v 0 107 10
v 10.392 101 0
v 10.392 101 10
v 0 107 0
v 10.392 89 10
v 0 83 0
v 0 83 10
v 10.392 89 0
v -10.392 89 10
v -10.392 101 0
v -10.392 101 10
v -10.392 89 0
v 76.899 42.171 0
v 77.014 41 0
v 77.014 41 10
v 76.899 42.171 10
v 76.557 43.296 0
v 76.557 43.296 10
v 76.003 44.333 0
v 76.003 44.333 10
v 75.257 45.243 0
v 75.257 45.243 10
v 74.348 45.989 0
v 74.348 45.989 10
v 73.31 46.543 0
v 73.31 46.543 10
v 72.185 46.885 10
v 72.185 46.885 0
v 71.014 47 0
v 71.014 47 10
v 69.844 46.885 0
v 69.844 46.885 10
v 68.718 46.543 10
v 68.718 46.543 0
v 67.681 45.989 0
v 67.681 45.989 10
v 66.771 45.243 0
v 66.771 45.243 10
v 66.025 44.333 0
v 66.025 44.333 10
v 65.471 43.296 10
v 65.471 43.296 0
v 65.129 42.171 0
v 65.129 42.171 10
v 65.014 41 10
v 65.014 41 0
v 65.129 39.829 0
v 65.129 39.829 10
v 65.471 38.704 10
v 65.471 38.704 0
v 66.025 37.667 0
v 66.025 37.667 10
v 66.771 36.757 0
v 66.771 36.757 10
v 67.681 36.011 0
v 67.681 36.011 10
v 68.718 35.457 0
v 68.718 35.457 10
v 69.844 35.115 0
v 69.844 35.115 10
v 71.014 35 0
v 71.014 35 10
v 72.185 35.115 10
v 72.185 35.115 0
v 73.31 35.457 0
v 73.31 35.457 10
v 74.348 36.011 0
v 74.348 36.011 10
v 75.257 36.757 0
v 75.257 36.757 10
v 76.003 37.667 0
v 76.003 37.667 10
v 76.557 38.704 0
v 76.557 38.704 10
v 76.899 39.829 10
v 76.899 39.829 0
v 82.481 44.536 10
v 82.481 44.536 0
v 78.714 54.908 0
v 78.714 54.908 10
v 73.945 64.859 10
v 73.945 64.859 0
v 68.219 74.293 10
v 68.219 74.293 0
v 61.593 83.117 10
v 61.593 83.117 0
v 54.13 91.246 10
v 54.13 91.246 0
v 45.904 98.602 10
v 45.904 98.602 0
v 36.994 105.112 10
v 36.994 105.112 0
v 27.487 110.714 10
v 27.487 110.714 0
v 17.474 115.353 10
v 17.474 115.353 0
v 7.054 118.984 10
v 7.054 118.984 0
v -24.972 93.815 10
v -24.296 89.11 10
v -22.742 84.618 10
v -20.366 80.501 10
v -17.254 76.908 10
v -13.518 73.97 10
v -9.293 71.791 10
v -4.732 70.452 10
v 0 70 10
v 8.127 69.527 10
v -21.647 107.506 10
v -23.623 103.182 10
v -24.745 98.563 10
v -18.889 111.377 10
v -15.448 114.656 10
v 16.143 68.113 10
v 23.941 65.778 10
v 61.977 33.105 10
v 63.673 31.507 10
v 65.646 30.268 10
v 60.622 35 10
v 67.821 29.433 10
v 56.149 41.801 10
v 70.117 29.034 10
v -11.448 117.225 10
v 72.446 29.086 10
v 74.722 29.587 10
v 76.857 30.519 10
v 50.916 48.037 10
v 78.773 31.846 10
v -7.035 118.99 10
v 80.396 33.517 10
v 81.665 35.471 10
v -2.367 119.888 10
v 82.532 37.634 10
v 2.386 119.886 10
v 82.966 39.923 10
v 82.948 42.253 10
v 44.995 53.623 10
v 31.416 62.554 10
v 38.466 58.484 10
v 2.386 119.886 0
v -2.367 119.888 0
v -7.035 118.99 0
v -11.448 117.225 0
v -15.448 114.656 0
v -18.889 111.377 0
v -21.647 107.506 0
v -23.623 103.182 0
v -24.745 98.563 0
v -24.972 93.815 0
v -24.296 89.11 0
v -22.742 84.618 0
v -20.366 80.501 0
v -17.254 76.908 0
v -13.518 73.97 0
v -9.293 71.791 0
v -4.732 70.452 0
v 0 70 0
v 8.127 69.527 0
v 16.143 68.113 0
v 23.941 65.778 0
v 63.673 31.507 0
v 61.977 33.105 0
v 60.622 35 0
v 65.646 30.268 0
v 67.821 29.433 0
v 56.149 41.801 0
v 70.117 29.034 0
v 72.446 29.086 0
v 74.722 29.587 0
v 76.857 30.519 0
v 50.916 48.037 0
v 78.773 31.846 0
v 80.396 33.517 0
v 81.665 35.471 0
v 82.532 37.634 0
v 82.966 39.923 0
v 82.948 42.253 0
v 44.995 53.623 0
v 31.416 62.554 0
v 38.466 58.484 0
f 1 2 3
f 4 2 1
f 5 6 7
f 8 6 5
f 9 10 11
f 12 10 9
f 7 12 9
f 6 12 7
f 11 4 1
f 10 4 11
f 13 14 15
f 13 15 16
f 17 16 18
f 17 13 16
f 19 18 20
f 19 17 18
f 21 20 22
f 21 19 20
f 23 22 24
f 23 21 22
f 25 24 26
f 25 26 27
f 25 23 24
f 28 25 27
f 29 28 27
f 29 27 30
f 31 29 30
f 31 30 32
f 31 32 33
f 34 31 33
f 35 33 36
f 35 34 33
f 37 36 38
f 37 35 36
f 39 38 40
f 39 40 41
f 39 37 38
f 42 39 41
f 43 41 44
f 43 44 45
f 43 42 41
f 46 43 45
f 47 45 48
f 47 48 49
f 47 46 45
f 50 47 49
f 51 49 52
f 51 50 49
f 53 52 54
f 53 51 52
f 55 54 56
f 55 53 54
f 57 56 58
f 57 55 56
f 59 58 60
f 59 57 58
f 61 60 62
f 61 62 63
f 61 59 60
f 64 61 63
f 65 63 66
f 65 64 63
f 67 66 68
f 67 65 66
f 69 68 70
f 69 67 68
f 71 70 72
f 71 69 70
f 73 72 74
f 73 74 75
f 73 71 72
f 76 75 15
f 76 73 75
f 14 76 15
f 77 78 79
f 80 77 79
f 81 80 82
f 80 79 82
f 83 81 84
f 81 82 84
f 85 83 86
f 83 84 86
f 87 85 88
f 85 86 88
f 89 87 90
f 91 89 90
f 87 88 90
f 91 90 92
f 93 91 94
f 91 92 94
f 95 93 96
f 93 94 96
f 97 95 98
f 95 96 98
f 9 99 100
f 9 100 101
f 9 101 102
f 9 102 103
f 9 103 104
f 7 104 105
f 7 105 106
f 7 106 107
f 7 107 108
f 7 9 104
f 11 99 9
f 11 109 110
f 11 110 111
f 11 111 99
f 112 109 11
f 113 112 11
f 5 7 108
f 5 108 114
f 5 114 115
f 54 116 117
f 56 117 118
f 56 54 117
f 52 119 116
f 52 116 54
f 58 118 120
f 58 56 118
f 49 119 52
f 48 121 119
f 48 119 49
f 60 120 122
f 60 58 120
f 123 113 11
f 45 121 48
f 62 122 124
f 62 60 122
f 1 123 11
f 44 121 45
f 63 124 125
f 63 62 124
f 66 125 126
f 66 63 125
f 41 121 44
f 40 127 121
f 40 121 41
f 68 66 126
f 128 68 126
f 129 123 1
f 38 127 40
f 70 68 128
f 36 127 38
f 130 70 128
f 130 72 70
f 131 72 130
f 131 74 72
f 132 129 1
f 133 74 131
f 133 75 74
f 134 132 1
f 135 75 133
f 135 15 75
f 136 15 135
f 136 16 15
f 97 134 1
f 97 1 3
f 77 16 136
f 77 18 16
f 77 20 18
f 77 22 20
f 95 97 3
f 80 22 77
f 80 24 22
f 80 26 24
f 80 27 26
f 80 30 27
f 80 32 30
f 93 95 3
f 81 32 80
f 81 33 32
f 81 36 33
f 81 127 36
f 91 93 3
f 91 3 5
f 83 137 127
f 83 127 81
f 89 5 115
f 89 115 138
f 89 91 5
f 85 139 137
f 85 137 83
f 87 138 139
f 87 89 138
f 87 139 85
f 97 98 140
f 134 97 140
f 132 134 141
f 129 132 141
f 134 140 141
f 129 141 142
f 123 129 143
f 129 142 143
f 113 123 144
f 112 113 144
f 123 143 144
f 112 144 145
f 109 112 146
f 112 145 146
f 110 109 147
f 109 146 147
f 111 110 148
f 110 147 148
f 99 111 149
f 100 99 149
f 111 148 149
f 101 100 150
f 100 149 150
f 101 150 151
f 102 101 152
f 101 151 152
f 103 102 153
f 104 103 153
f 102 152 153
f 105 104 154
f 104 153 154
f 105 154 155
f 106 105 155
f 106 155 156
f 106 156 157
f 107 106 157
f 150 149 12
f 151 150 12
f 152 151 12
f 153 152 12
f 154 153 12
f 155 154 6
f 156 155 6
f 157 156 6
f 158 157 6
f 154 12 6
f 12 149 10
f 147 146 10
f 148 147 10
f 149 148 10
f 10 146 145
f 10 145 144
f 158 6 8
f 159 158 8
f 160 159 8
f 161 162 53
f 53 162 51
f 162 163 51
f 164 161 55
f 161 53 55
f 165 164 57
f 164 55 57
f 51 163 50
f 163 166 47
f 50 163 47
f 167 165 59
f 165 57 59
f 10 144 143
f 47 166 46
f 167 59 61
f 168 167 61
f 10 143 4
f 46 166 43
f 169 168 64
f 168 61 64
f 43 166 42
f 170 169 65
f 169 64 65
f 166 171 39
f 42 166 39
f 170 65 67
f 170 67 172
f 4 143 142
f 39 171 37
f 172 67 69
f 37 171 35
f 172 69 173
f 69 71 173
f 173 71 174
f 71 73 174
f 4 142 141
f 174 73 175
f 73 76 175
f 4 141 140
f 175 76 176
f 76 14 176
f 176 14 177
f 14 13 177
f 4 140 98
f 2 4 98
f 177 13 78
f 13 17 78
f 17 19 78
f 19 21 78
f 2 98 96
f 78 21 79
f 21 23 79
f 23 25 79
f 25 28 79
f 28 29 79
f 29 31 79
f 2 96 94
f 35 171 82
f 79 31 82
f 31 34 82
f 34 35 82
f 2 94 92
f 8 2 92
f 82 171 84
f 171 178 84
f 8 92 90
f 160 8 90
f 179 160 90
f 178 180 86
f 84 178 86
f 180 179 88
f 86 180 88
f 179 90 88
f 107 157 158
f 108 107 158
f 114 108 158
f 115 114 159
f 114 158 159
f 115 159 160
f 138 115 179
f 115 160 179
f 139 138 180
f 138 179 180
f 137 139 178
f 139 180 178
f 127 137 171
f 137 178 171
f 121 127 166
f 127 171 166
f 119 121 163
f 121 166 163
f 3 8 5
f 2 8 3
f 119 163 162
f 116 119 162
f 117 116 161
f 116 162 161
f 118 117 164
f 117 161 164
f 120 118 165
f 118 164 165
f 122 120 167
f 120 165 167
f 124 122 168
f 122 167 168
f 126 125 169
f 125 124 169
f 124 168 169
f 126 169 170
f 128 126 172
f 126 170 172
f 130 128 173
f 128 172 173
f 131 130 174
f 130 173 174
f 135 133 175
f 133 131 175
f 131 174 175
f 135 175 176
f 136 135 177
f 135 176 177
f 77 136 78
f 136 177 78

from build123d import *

# Parameters (mm, degrees)
SKETCH1_R           = 25
SKETCH1_R_2         = 12
SKETCH1_R_3         = 6
BOSS_EXTRUDE1_DEPTH = 10


with BuildPart() as part:
    # Sketch1 → Boss-Extrude1 (new body)
    # profile 1 of 3: a face of its own
    with BuildSketch(Plane.XY):
        with Locations((0, 95)):
            Circle(SKETCH1_R)
        Polygon((-10.392304845, 89), (0, 83), (10.392304845, 89), (10.392304845, 101), (0, 107), (-10.392304845, 101), align=None, mode=Mode.SUBTRACT)
    # profile 2 of 3: a face of its own
    with BuildSketch(Plane.XY):
        with BuildLine():
            ThreePointArc((0, 70), (35, 60.621778265), (60.621778265, 35))
            ThreePointArc((60.621778265, 35), (66.215959074, 51.999000215), (82.481329918, 44.535852182))
            ThreePointArc((82.481329918, 44.535852182), (54.13048872, 91.246307211), (7.053536481, 118.98432036))
            ThreePointArc((7.053536481, 118.98432036), (20.016723159, 109.977676522), (25, 95))
            ThreePointArc((25, 95), (17.67766953, 77.32233047), (0, 70))
        make_face()
    # profile 3 of 3: a face of its own
    with BuildSketch(Plane.XY):
        with Locations((71.01408311, 41)):
            Circle(SKETCH1_R_2)
        with Locations((71.01408311, 41)):
            Circle(SKETCH1_R_3, mode=Mode.SUBTRACT)
    extrude(amount=BOSS_EXTRUDE1_DEPTH)


solid = part.part
